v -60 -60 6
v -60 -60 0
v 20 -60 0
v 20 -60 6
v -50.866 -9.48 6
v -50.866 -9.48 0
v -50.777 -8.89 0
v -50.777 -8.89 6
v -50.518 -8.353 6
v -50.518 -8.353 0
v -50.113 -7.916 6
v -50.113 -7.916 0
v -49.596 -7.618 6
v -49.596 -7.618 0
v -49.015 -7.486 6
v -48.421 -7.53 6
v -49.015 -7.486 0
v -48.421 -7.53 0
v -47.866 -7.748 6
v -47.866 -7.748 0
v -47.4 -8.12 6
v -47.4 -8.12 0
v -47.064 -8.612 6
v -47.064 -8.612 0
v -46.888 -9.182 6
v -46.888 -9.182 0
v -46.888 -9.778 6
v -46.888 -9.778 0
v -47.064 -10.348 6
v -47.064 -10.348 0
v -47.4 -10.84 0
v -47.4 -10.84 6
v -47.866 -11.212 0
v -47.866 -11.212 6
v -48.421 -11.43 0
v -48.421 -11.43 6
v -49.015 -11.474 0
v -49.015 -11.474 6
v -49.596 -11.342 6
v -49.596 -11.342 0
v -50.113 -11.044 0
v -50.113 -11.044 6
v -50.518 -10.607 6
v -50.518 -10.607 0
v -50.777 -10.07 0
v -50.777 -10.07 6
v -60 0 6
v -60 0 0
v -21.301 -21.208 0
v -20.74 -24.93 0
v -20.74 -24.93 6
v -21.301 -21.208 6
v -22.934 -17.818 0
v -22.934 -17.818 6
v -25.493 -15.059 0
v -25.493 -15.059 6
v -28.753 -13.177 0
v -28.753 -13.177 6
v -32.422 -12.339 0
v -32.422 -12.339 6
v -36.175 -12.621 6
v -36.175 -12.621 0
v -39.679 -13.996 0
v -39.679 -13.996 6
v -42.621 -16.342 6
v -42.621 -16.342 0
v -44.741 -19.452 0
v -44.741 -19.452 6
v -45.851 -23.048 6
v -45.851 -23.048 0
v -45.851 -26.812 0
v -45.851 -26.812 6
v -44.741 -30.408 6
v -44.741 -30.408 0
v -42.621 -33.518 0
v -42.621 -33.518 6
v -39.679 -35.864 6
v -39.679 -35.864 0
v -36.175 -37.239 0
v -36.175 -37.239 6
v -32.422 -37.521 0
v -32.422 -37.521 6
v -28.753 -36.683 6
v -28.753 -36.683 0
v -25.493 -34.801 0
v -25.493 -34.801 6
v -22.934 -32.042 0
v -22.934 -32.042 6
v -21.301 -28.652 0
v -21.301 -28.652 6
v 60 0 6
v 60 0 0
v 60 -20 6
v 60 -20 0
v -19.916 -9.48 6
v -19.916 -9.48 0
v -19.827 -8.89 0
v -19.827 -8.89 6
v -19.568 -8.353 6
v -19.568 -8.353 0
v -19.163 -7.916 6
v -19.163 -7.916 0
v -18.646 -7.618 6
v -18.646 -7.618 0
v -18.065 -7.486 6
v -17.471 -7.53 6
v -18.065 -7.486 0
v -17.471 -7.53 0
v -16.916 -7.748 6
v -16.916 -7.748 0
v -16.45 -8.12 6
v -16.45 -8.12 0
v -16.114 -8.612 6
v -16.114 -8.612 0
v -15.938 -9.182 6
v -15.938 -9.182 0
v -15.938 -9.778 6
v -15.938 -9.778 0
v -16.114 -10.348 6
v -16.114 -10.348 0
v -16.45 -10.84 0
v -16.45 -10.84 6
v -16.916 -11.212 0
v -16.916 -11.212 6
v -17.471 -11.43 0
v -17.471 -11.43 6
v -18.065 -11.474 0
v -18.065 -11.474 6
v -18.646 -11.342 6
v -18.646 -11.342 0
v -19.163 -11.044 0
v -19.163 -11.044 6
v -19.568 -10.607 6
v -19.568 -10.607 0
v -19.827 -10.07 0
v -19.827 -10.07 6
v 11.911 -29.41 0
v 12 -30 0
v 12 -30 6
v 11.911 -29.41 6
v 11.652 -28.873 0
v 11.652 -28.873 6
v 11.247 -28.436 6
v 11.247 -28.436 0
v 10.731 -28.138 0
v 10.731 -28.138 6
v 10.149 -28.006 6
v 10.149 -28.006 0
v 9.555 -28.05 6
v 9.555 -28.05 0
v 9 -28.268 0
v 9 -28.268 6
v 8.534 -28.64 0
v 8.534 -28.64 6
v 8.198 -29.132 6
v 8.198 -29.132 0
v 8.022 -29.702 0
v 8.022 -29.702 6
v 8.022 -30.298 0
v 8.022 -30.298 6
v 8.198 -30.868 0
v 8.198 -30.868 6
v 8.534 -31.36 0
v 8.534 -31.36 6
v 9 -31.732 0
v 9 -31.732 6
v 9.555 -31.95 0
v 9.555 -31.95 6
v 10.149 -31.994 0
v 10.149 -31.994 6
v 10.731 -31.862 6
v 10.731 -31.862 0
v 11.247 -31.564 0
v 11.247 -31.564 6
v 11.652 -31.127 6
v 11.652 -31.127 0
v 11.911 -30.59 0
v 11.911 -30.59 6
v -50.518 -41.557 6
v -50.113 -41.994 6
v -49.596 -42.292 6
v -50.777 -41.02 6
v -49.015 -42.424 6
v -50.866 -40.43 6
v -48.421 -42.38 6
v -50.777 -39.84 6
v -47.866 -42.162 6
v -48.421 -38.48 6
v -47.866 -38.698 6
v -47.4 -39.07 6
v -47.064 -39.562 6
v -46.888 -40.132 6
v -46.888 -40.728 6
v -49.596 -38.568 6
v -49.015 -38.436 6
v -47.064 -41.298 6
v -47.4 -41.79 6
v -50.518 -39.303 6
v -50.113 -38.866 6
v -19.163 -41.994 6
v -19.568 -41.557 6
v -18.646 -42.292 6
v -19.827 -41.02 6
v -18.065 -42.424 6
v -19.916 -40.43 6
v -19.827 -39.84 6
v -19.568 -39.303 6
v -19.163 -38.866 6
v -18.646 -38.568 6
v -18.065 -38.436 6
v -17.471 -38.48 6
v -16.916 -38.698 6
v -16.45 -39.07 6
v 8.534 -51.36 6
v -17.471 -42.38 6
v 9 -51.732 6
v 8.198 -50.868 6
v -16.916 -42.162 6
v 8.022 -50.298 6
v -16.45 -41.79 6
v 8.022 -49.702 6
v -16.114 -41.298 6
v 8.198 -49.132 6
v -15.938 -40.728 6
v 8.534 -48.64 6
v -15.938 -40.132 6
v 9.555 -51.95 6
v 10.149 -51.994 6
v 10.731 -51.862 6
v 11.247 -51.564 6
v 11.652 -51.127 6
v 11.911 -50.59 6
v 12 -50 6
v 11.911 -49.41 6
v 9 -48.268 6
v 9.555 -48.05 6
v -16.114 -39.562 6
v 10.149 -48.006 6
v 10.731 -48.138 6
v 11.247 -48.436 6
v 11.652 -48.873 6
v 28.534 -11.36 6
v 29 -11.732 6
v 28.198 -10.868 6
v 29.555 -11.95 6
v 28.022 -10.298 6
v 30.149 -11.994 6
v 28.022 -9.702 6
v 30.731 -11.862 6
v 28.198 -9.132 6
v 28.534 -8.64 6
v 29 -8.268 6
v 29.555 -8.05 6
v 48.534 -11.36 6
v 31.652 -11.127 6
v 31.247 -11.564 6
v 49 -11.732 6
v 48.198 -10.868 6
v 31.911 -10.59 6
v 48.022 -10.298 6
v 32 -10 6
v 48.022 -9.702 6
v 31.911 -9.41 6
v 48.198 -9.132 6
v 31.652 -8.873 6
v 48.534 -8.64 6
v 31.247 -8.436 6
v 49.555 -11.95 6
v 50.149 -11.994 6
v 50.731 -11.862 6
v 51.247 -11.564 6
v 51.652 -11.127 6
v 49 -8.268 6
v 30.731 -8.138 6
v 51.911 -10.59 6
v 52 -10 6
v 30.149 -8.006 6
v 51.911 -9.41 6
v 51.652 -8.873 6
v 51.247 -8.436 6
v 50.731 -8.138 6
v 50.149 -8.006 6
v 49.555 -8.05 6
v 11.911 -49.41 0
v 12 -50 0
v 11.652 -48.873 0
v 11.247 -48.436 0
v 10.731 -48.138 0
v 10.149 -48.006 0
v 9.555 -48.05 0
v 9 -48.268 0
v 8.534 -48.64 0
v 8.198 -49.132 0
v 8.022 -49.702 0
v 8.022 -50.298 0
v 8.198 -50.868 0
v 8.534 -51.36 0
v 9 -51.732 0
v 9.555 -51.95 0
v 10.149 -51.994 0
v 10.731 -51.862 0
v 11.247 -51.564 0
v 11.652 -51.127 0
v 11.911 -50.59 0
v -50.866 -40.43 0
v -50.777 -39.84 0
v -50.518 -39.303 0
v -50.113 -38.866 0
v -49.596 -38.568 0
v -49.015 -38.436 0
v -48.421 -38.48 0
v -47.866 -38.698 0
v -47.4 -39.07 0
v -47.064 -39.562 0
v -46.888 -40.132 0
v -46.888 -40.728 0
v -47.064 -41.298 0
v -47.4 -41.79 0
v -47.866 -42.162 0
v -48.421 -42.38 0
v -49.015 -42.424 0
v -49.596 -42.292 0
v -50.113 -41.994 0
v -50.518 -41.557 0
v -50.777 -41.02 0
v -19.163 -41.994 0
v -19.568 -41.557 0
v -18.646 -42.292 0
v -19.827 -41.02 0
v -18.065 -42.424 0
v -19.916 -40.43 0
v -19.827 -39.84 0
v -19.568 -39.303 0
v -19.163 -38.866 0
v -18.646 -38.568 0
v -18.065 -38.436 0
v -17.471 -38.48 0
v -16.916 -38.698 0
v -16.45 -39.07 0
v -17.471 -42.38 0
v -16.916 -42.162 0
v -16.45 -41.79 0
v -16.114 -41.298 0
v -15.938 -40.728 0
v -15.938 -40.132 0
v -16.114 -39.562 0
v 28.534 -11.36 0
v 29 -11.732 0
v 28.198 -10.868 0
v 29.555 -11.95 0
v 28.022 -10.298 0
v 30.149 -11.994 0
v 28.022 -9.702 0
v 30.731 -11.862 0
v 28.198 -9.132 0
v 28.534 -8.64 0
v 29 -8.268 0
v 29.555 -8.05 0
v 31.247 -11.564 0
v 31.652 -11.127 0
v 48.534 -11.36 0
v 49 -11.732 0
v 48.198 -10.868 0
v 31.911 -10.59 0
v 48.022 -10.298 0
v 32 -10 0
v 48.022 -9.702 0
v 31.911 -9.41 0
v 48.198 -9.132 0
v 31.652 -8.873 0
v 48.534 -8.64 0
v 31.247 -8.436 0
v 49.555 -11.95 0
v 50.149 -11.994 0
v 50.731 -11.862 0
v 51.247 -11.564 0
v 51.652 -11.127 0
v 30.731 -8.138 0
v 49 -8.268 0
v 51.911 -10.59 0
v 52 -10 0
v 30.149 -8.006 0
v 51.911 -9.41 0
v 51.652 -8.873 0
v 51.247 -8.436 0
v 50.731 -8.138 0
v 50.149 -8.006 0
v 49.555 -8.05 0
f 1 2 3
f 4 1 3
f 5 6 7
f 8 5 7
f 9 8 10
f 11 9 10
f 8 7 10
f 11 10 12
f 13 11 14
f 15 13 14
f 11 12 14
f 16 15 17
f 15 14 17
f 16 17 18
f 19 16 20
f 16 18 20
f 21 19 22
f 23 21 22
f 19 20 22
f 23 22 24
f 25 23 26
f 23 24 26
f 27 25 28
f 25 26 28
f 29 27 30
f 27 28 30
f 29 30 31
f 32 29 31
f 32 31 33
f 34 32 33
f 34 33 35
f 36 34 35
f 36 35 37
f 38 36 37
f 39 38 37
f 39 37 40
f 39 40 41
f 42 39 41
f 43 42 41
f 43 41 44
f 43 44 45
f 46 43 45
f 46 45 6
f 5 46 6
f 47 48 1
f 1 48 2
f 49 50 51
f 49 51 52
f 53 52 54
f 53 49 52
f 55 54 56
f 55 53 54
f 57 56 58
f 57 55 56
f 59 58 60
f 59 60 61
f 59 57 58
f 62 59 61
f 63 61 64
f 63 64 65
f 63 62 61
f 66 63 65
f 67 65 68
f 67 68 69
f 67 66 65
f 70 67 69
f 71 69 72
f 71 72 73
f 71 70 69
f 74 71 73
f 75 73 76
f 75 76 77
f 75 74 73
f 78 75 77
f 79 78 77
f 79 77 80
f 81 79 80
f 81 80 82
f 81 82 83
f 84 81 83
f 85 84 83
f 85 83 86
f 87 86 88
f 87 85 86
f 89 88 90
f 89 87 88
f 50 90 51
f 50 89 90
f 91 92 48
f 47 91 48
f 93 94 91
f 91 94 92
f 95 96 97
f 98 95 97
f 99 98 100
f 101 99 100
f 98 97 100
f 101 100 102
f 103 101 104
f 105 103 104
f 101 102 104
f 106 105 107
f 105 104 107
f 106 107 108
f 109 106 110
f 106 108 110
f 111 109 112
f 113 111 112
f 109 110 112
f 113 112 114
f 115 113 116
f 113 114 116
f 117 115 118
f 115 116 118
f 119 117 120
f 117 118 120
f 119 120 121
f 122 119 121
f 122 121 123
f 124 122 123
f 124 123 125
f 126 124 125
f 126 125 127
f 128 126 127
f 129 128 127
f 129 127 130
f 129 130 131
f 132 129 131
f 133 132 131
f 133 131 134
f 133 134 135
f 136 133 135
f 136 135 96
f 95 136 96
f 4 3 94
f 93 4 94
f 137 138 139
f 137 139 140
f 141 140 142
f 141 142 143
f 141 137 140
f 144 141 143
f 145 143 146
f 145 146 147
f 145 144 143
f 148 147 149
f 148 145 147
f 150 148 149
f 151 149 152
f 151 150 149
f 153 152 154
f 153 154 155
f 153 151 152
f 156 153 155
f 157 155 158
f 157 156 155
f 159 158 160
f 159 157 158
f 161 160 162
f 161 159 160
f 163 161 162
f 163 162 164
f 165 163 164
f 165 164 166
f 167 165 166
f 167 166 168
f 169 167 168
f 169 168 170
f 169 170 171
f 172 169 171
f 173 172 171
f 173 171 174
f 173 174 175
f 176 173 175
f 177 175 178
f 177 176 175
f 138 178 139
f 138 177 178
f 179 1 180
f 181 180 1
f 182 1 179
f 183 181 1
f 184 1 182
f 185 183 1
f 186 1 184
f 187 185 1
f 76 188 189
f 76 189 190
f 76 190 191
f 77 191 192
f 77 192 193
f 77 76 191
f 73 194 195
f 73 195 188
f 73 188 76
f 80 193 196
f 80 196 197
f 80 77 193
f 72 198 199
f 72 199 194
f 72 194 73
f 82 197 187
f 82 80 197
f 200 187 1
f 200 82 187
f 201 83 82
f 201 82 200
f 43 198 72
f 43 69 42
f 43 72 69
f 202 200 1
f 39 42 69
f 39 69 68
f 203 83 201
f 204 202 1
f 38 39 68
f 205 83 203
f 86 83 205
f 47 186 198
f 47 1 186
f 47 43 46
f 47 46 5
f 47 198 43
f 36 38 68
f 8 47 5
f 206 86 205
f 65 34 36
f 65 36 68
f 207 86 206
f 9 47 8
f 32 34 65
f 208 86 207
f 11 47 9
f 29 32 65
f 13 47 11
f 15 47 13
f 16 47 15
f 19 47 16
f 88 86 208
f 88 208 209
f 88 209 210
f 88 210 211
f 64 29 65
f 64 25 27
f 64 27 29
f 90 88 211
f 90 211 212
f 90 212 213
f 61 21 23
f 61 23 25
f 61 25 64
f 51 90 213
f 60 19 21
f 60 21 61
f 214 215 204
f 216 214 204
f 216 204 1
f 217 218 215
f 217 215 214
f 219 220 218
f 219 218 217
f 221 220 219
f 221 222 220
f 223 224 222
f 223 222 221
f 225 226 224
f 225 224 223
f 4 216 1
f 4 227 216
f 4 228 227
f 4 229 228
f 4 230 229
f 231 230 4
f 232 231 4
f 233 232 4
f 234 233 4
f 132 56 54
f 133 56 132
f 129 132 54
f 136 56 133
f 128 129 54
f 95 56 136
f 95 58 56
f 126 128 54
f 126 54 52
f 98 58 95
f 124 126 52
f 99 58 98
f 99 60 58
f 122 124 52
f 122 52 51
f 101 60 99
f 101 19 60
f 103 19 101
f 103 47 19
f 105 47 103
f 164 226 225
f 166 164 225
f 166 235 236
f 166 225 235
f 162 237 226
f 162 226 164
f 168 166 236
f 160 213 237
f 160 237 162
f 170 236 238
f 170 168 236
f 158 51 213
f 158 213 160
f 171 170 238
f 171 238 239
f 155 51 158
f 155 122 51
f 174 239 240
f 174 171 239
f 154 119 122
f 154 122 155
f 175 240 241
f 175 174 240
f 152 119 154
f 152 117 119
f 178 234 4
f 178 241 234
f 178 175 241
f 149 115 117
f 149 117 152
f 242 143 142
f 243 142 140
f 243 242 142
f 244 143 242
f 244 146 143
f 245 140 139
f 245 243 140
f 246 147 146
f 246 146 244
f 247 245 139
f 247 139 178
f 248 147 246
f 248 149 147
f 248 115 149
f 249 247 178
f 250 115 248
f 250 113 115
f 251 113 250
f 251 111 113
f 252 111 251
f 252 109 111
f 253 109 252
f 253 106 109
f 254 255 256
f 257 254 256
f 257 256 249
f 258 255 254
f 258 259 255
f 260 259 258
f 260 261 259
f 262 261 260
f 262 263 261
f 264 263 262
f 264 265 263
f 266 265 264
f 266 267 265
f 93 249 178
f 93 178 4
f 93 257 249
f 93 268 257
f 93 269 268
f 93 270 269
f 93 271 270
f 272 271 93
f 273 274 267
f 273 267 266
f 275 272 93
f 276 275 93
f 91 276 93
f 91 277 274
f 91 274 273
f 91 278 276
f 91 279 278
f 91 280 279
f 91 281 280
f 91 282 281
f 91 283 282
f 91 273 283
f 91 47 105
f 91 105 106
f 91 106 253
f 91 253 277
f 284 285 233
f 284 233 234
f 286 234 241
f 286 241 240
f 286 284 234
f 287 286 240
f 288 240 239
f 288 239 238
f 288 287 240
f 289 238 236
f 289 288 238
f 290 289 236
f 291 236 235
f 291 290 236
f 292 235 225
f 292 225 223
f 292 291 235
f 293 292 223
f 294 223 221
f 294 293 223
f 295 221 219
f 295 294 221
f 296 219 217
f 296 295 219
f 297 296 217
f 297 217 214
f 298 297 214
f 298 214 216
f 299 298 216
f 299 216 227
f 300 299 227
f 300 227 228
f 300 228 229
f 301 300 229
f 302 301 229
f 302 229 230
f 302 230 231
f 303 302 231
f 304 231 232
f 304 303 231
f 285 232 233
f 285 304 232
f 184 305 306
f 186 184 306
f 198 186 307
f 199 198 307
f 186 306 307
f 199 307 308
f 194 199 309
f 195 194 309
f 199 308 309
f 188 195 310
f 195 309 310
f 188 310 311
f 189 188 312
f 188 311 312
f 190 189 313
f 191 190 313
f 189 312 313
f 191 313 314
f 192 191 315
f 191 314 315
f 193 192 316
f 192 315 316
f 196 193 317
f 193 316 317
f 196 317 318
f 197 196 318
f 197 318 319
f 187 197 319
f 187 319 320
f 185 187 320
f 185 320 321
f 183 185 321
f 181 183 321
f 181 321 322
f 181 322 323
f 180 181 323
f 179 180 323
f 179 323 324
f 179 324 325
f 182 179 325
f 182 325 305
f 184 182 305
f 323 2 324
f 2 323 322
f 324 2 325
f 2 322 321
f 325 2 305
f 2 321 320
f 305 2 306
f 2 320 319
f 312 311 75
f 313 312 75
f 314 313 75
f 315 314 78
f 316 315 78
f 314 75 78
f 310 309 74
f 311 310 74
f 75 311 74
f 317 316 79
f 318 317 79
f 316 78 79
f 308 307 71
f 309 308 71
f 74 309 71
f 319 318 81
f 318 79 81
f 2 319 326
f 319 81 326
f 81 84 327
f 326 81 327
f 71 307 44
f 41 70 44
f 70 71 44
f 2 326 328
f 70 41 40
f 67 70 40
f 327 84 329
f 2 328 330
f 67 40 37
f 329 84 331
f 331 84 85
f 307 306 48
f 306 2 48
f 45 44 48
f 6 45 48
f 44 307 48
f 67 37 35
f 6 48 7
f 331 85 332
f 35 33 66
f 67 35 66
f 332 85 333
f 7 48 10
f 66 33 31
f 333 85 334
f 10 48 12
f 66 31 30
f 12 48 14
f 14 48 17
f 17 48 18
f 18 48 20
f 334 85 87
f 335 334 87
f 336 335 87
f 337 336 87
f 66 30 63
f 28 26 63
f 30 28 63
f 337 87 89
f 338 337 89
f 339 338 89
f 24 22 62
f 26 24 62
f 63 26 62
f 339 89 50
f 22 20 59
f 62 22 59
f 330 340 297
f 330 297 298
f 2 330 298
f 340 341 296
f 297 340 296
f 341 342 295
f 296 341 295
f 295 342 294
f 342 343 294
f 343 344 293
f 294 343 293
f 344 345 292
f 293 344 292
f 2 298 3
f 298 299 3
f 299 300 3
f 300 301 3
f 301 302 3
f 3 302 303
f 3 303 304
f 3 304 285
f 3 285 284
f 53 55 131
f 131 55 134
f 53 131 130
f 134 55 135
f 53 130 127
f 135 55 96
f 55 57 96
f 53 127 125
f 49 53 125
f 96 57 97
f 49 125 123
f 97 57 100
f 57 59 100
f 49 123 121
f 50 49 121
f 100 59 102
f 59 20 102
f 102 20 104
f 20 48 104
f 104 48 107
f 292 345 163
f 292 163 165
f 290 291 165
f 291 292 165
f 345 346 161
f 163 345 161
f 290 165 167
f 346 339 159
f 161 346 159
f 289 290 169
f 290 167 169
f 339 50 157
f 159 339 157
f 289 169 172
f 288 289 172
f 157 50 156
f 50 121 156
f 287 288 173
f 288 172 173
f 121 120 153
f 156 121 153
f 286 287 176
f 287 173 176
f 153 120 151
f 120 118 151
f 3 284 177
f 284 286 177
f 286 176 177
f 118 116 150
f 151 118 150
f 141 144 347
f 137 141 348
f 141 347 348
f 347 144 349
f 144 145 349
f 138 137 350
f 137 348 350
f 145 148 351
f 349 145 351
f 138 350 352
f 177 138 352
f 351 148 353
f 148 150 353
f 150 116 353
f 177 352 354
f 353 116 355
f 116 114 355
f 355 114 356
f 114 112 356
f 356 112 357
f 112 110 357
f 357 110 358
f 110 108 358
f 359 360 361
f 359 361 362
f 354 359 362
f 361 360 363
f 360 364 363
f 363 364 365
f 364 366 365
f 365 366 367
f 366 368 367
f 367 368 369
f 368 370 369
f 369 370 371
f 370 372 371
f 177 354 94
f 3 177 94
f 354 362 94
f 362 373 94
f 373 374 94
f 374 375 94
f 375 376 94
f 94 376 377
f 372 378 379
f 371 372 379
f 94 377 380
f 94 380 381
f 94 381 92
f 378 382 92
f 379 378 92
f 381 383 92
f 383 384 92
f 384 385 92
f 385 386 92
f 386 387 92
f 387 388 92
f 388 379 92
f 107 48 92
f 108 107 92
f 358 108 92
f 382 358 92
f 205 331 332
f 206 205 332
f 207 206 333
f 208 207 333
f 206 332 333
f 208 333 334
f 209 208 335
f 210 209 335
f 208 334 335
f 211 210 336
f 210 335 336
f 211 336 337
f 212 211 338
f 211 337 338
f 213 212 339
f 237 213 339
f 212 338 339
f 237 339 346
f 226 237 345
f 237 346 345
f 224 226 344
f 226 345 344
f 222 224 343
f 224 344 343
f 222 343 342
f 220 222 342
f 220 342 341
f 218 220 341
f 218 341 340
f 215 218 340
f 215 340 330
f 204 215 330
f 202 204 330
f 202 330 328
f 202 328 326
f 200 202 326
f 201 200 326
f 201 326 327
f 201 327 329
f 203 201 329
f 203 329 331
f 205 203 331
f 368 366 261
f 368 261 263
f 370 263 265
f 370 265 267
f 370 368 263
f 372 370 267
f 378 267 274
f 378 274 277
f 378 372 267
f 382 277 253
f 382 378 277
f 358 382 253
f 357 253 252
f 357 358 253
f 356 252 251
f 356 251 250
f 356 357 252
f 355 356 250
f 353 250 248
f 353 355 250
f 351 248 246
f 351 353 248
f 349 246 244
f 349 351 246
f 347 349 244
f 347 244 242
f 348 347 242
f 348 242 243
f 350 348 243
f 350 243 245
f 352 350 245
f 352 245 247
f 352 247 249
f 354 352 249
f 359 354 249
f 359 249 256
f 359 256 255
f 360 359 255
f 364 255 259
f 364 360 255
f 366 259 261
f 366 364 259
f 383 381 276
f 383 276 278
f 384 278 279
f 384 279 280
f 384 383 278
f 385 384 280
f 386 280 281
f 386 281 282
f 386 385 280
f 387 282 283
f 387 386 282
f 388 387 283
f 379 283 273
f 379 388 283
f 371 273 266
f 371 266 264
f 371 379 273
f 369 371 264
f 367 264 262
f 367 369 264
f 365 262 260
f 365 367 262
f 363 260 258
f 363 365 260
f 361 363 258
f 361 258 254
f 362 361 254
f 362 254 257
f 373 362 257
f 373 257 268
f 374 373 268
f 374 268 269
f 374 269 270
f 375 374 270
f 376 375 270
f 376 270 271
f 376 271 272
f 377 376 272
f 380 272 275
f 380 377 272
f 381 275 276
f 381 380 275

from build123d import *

# Parameters (mm, degrees)
SKETCH1_R           = 2
SKETCH1_R_2         = 12.625986588
BOSS_EXTRUDE1_DEPTH = 6
SKETCH2_R           = 2
CUT_EXTRUDE1_DEPTH  = 10


with BuildPart() as part:
    # Sketch1 → Boss-Extrude1 (new body)
    with BuildSketch(Plane.XY):
        Polygon((20, -60), (60, -20), (60, 0), (0, 0), (-60, 0), (-60, -60), (0, -60), align=None)
        with Locations((50, -10)):
            Circle(SKETCH1_R, mode=Mode.SUBTRACT)
        with Locations((30, -10)):
            Circle(SKETCH1_R, mode=Mode.SUBTRACT)
        with Locations((10, -50)):
            Circle(SKETCH1_R, mode=Mode.SUBTRACT)
        with Locations((10, -30)):
            Circle(SKETCH1_R, mode=Mode.SUBTRACT)
        with Locations((-33.365647648, -24.93)):
            Circle(SKETCH1_R_2, mode=Mode.SUBTRACT)
    extrude(amount=BOSS_EXTRUDE1_DEPTH)

    # Sketch2 → Cut-Extrude1 (cut)
    with BuildSketch(Plane(origin=(0, 0, 0), x_dir=(-1, 0, 0), z_dir=(0, 0, -1))):
        with Locations((17.915647648, -9.48)):
            Circle(SKETCH2_R)
        with Locations((17.915647648, -40.43)):
            Circle(SKETCH2_R)
        with Locations((48.865647648, -9.48)):
            Circle(SKETCH2_R)
        with Locations((48.865647648, -40.43)):
            Circle(SKETCH2_R)
    extrude(amount=-CUT_EXTRUDE1_DEPTH, mode=Mode.SUBTRACT)


solid = part.part
